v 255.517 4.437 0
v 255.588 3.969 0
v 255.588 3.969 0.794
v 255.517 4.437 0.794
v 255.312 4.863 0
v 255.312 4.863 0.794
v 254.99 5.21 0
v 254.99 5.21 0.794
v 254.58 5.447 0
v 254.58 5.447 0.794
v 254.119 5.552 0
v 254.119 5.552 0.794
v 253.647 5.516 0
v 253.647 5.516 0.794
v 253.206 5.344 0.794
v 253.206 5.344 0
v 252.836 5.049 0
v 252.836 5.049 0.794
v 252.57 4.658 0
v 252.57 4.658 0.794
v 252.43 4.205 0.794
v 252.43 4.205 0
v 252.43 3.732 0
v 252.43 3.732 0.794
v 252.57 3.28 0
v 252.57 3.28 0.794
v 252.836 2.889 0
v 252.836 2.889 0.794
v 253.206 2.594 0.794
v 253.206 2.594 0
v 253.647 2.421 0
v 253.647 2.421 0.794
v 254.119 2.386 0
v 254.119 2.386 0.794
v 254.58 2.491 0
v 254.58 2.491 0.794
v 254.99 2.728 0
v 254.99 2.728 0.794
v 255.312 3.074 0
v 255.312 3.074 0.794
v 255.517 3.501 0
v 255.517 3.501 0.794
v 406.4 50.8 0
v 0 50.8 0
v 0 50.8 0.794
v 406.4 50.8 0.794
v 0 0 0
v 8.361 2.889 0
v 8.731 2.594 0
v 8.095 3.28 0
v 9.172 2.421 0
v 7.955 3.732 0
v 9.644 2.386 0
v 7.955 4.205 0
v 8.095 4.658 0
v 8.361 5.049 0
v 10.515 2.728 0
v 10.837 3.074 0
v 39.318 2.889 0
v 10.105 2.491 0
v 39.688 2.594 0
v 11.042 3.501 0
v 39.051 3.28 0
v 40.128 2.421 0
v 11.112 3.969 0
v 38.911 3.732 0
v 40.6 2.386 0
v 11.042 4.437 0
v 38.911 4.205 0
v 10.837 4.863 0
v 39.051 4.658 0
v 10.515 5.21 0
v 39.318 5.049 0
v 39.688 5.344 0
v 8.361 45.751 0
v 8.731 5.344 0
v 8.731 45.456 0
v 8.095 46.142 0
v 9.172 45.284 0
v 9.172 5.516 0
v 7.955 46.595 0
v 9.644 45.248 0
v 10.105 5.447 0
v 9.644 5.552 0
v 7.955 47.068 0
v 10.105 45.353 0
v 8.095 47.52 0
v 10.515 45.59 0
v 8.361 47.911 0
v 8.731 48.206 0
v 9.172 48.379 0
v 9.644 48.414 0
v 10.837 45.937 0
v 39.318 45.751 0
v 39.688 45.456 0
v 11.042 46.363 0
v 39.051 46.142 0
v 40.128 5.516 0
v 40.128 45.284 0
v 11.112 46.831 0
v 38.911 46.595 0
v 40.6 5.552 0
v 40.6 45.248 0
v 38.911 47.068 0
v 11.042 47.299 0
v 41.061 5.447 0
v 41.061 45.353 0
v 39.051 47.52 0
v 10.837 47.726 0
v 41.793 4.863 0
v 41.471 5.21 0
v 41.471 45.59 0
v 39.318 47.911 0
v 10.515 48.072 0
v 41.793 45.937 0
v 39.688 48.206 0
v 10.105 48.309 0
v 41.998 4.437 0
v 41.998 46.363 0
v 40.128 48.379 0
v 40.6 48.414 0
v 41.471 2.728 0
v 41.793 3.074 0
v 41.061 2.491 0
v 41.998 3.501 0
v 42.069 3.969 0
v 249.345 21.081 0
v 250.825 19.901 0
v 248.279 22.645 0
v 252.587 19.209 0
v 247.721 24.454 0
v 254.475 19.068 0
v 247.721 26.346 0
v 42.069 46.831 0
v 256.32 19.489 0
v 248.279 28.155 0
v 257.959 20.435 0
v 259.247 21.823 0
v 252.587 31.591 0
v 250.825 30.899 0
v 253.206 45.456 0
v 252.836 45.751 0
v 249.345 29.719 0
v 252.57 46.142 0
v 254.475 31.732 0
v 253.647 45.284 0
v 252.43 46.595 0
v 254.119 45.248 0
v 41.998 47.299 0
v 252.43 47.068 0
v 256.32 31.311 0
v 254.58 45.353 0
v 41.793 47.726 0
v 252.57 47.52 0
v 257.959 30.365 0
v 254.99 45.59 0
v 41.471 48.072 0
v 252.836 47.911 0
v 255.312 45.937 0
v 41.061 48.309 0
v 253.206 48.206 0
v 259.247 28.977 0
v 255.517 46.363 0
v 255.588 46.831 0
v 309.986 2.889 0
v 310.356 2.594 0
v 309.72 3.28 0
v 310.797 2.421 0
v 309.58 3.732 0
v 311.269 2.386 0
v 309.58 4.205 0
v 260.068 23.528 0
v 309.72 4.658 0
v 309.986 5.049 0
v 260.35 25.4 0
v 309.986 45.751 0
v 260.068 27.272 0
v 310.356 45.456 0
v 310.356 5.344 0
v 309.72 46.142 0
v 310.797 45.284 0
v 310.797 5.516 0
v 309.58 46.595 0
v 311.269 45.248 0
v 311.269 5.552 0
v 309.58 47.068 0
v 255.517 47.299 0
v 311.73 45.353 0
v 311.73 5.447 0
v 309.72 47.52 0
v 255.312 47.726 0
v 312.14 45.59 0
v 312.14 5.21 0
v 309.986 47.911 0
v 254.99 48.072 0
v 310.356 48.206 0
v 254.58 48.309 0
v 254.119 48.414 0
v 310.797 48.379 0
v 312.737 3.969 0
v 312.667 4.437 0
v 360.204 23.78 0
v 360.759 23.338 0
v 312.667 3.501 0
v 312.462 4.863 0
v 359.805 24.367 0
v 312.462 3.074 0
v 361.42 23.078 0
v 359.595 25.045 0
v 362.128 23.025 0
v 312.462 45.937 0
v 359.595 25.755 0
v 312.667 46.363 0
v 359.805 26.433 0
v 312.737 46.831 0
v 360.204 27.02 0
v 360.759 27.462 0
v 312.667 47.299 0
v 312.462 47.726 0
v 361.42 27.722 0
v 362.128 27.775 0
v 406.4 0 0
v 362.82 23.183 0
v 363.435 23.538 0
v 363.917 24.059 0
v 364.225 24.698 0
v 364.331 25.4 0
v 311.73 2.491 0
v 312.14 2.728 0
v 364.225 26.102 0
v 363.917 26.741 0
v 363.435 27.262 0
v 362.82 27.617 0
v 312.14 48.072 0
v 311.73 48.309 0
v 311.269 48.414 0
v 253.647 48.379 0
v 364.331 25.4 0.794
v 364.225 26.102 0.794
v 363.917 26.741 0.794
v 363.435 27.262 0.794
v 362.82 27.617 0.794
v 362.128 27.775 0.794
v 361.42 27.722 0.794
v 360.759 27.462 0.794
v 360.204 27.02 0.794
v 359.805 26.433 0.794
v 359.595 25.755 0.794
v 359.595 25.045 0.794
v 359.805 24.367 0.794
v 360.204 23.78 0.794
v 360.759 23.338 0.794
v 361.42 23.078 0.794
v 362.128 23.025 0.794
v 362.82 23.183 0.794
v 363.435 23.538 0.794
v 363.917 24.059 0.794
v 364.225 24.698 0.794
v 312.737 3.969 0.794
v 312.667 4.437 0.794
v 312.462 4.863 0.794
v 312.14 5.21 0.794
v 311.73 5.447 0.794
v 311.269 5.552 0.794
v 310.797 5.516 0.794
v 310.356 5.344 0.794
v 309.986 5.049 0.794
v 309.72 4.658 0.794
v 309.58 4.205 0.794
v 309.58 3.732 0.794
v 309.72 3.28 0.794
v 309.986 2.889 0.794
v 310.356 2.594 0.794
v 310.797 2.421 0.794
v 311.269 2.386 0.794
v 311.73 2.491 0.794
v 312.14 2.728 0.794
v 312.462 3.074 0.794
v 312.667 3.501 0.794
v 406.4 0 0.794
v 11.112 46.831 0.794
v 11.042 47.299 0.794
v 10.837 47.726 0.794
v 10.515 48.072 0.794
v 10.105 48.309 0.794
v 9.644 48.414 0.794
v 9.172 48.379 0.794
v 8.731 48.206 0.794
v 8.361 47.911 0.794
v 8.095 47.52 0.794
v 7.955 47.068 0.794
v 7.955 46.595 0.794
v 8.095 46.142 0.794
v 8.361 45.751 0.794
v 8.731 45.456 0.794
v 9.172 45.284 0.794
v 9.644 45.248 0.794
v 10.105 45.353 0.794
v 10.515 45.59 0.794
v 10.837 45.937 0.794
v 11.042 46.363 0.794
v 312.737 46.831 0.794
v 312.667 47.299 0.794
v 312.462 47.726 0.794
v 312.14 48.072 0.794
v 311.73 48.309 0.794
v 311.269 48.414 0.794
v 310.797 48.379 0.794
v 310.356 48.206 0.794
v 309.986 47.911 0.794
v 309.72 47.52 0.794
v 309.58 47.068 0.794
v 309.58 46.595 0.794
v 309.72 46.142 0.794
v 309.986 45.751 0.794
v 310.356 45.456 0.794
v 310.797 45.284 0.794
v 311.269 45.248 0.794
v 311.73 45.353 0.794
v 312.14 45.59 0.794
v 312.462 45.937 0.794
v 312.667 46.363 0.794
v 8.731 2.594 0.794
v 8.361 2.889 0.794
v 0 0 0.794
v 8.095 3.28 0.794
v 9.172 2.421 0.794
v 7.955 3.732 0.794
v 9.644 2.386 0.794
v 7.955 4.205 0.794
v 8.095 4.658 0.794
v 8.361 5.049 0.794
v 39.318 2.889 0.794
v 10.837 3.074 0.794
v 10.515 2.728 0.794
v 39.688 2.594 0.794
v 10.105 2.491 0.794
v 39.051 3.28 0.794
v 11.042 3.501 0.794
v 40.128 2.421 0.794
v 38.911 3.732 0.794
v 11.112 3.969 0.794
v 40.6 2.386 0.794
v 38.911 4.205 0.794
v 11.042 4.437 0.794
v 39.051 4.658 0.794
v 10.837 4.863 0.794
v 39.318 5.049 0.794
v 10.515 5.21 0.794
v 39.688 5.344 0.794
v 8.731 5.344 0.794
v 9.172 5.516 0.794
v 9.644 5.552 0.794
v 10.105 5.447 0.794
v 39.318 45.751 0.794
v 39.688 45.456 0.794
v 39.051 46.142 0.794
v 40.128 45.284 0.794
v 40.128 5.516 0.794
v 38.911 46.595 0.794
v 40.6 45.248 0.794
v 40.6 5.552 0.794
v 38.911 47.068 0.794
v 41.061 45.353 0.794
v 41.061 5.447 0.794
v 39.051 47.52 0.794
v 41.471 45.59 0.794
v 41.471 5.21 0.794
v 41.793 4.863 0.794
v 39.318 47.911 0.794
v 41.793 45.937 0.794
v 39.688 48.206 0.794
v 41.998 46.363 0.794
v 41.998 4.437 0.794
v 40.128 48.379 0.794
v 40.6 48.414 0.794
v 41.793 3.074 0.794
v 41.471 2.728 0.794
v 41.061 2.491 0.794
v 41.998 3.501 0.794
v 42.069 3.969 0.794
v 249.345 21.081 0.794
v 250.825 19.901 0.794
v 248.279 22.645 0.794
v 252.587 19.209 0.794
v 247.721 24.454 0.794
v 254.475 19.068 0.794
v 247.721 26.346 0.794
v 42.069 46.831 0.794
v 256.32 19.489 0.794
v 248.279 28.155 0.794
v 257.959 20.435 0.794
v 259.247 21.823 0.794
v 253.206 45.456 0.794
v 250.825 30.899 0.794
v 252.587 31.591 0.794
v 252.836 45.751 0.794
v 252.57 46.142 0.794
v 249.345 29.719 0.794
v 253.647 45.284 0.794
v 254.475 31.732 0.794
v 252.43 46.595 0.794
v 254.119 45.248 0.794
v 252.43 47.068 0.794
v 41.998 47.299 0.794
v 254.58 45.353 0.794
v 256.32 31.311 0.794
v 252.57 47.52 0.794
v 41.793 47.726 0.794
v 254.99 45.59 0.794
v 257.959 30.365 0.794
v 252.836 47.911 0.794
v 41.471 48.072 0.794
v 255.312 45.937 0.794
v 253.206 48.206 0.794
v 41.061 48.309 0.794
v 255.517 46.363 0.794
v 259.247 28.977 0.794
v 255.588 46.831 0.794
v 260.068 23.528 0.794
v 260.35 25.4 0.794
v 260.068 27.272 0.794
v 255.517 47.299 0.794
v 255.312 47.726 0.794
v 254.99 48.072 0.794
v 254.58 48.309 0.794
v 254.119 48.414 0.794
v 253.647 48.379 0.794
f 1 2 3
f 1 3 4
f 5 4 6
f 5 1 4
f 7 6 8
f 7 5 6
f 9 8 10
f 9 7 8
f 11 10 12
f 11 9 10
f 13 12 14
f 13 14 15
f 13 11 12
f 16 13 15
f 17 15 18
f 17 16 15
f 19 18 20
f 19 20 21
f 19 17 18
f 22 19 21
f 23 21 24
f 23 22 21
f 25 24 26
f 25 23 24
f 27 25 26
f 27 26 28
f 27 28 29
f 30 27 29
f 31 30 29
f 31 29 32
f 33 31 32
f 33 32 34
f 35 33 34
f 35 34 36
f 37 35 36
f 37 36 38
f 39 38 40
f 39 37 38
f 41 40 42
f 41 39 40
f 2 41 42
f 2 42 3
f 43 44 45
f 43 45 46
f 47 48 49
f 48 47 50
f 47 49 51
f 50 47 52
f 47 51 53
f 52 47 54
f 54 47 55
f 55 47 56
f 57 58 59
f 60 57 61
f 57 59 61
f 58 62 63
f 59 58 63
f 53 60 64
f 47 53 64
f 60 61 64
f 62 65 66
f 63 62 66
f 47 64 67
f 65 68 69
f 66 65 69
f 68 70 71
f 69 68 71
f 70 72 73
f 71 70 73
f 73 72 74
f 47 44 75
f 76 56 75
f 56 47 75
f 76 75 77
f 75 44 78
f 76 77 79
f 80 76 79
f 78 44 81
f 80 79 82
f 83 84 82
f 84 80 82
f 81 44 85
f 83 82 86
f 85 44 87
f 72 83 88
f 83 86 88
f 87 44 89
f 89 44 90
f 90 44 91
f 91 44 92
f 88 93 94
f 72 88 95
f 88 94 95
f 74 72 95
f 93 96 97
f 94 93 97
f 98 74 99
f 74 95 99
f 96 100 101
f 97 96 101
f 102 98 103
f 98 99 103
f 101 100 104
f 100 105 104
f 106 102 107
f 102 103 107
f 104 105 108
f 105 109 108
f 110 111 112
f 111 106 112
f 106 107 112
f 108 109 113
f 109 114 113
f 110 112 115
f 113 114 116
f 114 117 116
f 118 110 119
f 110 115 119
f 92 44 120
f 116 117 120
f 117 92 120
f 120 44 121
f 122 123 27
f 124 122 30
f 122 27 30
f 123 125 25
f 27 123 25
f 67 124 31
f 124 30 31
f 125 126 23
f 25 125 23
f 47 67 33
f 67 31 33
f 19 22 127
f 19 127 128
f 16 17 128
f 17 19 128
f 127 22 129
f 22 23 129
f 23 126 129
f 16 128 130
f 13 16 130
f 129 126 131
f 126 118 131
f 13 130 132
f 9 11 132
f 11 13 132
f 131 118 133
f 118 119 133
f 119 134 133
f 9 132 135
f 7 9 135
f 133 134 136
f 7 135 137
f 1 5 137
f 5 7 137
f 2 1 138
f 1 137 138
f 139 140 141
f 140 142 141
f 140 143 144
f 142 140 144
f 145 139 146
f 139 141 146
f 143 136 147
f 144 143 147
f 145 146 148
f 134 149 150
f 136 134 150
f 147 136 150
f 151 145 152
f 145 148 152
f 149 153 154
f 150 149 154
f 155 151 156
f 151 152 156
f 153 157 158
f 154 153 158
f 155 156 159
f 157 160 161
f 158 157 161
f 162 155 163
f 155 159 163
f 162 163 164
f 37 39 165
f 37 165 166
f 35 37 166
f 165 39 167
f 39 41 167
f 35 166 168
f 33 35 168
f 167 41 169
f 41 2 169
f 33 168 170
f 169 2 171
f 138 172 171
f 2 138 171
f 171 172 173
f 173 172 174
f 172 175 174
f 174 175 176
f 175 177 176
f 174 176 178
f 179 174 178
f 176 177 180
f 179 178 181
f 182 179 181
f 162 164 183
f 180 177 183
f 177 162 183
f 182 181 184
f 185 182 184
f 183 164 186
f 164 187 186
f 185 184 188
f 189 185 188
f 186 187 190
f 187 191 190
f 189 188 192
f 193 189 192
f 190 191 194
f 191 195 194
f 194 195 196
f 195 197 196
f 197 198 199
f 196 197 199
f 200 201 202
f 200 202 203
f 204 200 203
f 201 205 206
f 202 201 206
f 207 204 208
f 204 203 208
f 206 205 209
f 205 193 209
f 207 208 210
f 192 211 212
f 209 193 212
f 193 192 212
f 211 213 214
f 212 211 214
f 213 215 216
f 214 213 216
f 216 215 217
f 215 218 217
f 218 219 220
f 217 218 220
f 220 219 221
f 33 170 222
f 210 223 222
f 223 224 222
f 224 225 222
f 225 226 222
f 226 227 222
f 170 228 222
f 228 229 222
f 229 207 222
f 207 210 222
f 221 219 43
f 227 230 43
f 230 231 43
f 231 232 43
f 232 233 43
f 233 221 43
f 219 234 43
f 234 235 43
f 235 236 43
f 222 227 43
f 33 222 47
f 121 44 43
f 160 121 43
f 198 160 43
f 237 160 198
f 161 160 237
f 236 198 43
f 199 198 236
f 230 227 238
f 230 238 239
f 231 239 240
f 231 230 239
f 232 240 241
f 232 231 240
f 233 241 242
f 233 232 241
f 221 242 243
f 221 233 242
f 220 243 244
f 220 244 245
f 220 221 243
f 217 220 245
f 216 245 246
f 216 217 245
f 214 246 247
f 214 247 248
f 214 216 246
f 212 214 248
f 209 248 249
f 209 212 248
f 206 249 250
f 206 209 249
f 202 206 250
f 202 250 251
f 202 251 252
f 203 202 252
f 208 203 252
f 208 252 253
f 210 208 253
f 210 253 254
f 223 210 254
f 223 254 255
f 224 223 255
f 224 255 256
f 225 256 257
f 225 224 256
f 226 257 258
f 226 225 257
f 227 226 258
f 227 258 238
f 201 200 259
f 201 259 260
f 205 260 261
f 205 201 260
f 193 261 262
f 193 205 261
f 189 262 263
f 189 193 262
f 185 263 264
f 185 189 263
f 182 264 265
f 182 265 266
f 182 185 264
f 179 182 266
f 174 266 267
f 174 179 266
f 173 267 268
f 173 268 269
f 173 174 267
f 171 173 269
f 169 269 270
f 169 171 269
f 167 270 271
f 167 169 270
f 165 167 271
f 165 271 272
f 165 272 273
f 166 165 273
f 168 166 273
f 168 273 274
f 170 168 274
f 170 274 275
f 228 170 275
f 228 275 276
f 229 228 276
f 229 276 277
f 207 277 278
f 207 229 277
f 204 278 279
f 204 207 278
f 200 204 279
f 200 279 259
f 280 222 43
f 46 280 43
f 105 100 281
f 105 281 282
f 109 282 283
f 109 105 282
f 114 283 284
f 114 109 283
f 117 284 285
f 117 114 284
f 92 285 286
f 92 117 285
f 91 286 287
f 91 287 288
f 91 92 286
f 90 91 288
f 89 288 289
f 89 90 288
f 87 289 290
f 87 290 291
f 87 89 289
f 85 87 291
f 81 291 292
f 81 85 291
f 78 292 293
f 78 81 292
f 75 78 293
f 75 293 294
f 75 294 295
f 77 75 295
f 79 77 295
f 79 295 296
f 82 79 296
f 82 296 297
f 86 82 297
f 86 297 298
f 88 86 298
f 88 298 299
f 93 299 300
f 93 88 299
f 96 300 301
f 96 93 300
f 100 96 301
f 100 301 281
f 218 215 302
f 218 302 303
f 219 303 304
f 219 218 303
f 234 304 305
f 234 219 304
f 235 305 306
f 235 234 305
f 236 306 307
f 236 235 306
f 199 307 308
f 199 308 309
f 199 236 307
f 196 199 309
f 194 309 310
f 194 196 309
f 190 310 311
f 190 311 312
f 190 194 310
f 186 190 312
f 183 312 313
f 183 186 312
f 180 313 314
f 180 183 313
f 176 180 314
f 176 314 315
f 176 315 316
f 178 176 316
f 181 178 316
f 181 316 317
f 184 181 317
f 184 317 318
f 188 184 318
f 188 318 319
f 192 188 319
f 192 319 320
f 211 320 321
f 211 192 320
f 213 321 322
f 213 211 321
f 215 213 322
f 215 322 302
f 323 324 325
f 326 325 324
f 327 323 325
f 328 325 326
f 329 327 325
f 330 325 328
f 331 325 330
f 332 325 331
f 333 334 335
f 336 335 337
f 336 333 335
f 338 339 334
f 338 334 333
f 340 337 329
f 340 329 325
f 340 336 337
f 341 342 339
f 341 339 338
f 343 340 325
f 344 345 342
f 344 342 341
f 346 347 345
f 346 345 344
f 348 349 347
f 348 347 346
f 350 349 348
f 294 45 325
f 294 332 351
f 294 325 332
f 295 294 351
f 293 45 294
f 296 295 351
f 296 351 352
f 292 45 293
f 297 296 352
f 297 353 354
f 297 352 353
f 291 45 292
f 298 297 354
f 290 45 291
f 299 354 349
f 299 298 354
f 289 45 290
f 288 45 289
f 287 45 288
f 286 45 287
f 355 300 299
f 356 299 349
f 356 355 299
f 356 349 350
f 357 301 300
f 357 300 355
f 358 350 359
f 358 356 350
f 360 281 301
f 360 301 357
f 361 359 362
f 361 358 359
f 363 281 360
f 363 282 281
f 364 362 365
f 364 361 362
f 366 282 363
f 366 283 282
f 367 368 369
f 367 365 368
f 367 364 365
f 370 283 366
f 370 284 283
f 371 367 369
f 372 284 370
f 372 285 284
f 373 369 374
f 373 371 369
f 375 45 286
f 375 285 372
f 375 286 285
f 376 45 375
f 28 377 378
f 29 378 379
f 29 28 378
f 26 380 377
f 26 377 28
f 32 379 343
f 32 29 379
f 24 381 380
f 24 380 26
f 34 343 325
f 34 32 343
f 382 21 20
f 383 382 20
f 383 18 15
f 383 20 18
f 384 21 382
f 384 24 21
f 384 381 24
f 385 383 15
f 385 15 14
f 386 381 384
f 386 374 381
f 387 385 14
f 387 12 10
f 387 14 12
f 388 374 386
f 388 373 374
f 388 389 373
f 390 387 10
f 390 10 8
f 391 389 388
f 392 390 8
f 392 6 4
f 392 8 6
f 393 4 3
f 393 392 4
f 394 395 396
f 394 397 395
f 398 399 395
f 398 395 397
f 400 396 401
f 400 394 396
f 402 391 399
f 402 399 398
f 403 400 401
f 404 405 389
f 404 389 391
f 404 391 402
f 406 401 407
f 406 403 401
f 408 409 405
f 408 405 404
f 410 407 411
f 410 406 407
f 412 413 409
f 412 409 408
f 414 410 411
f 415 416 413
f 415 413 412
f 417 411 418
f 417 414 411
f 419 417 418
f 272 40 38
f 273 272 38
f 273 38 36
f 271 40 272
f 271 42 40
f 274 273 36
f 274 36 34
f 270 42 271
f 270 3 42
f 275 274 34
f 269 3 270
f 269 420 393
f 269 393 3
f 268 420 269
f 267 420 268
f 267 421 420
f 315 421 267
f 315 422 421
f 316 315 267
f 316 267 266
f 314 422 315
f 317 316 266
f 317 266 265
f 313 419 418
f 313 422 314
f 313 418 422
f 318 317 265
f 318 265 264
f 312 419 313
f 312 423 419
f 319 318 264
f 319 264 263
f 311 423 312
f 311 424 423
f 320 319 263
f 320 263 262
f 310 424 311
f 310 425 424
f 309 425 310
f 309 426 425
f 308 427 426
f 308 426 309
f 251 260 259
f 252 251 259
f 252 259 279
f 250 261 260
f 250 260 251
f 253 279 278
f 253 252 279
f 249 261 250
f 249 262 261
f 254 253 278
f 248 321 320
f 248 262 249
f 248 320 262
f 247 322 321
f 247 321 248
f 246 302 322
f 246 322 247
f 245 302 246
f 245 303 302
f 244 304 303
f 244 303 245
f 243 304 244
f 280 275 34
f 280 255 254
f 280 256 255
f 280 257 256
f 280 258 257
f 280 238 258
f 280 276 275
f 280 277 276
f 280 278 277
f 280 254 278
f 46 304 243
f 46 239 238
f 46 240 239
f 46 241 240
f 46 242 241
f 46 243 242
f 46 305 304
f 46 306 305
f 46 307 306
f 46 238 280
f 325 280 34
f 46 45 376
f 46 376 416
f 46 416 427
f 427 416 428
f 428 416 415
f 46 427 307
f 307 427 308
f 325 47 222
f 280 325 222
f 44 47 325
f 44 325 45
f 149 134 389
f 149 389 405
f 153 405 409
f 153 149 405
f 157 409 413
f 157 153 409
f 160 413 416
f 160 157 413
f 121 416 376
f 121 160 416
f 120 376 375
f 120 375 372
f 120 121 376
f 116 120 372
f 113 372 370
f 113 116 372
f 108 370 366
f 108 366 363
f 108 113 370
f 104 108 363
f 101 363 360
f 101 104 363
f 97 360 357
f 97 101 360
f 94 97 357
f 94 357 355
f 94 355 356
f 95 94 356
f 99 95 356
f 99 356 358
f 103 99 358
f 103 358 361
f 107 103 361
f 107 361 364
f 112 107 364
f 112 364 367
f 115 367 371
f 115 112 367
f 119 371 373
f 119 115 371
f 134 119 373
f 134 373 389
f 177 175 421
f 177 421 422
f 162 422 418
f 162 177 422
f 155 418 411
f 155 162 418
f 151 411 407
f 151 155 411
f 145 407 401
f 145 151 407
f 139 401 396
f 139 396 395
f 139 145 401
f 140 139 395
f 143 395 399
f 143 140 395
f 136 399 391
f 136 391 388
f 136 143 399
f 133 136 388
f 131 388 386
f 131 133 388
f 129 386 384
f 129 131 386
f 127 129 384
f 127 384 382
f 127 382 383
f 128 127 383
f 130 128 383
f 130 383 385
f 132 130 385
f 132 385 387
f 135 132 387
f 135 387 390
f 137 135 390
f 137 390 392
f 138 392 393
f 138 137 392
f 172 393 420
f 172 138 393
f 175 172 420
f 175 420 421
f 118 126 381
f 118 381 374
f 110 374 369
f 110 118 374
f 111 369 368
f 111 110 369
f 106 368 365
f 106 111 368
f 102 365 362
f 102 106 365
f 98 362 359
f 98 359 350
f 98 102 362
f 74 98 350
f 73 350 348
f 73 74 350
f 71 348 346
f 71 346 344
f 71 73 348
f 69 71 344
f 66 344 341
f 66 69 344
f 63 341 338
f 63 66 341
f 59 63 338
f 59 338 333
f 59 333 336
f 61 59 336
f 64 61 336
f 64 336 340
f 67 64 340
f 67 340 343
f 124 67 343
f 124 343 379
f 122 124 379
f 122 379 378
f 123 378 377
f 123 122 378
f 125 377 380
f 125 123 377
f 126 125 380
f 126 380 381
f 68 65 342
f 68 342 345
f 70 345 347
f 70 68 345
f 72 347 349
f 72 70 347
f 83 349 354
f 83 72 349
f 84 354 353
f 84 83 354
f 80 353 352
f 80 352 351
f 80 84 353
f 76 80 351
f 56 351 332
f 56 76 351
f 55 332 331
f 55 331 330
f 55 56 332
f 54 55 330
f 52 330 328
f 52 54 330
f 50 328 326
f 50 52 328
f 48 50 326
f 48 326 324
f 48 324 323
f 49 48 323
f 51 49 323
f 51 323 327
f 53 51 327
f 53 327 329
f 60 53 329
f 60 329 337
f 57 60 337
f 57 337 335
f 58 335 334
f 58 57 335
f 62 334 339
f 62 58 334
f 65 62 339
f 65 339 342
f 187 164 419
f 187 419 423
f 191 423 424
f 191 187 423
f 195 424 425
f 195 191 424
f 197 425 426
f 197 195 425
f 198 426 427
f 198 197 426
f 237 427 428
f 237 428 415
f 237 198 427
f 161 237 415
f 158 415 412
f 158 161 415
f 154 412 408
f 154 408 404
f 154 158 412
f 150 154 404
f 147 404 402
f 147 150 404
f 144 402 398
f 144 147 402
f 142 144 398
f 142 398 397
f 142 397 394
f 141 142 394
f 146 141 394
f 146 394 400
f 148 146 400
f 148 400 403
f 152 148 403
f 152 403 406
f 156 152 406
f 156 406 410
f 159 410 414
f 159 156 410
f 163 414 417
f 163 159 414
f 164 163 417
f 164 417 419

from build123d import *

# Parameters (mm, degrees)
F0_W     = 406.4
F0_H     = 50.8
F0_R     = 1.5875
F0_R_2   = 6.35
F0_R_3   = 2.38125
F1_DEPTH = 0.79375


with BuildPart() as f1:
    # F0 (on Top) → F1 (new body)
    with BuildSketch(Plane.XY):
        with Locations((203.2, 25.4)):
            Rectangle(F0_W, F0_H)
        with Locations((9.525, 3.96875)):
            Circle(F0_R, mode=Mode.SUBTRACT)
        with Locations((40.48125, 3.96875)):
            Circle(F0_R, mode=Mode.SUBTRACT)
        with Locations((254, 3.96875)):
            Circle(F0_R, mode=Mode.SUBTRACT)
        with Locations((311.15, 3.96875)):
            Circle(F0_R, mode=Mode.SUBTRACT)
        with Locations((254, 25.4)):
            Circle(F0_R_2, mode=Mode.SUBTRACT)
        with Locations((361.95, 25.4)):
            Circle(F0_R_3, mode=Mode.SUBTRACT)
        with Locations((9.525, 46.83125)):
            Circle(F0_R, mode=Mode.SUBTRACT)
        with Locations((40.48125, 46.83125)):
            Circle(F0_R, mode=Mode.SUBTRACT)
        with Locations((254, 46.83125)):
            Circle(F0_R, mode=Mode.SUBTRACT)
        with Locations((311.15, 46.83125)):
            Circle(F0_R, mode=Mode.SUBTRACT)
    extrude(amount=F1_DEPTH)


solid = f1.part
